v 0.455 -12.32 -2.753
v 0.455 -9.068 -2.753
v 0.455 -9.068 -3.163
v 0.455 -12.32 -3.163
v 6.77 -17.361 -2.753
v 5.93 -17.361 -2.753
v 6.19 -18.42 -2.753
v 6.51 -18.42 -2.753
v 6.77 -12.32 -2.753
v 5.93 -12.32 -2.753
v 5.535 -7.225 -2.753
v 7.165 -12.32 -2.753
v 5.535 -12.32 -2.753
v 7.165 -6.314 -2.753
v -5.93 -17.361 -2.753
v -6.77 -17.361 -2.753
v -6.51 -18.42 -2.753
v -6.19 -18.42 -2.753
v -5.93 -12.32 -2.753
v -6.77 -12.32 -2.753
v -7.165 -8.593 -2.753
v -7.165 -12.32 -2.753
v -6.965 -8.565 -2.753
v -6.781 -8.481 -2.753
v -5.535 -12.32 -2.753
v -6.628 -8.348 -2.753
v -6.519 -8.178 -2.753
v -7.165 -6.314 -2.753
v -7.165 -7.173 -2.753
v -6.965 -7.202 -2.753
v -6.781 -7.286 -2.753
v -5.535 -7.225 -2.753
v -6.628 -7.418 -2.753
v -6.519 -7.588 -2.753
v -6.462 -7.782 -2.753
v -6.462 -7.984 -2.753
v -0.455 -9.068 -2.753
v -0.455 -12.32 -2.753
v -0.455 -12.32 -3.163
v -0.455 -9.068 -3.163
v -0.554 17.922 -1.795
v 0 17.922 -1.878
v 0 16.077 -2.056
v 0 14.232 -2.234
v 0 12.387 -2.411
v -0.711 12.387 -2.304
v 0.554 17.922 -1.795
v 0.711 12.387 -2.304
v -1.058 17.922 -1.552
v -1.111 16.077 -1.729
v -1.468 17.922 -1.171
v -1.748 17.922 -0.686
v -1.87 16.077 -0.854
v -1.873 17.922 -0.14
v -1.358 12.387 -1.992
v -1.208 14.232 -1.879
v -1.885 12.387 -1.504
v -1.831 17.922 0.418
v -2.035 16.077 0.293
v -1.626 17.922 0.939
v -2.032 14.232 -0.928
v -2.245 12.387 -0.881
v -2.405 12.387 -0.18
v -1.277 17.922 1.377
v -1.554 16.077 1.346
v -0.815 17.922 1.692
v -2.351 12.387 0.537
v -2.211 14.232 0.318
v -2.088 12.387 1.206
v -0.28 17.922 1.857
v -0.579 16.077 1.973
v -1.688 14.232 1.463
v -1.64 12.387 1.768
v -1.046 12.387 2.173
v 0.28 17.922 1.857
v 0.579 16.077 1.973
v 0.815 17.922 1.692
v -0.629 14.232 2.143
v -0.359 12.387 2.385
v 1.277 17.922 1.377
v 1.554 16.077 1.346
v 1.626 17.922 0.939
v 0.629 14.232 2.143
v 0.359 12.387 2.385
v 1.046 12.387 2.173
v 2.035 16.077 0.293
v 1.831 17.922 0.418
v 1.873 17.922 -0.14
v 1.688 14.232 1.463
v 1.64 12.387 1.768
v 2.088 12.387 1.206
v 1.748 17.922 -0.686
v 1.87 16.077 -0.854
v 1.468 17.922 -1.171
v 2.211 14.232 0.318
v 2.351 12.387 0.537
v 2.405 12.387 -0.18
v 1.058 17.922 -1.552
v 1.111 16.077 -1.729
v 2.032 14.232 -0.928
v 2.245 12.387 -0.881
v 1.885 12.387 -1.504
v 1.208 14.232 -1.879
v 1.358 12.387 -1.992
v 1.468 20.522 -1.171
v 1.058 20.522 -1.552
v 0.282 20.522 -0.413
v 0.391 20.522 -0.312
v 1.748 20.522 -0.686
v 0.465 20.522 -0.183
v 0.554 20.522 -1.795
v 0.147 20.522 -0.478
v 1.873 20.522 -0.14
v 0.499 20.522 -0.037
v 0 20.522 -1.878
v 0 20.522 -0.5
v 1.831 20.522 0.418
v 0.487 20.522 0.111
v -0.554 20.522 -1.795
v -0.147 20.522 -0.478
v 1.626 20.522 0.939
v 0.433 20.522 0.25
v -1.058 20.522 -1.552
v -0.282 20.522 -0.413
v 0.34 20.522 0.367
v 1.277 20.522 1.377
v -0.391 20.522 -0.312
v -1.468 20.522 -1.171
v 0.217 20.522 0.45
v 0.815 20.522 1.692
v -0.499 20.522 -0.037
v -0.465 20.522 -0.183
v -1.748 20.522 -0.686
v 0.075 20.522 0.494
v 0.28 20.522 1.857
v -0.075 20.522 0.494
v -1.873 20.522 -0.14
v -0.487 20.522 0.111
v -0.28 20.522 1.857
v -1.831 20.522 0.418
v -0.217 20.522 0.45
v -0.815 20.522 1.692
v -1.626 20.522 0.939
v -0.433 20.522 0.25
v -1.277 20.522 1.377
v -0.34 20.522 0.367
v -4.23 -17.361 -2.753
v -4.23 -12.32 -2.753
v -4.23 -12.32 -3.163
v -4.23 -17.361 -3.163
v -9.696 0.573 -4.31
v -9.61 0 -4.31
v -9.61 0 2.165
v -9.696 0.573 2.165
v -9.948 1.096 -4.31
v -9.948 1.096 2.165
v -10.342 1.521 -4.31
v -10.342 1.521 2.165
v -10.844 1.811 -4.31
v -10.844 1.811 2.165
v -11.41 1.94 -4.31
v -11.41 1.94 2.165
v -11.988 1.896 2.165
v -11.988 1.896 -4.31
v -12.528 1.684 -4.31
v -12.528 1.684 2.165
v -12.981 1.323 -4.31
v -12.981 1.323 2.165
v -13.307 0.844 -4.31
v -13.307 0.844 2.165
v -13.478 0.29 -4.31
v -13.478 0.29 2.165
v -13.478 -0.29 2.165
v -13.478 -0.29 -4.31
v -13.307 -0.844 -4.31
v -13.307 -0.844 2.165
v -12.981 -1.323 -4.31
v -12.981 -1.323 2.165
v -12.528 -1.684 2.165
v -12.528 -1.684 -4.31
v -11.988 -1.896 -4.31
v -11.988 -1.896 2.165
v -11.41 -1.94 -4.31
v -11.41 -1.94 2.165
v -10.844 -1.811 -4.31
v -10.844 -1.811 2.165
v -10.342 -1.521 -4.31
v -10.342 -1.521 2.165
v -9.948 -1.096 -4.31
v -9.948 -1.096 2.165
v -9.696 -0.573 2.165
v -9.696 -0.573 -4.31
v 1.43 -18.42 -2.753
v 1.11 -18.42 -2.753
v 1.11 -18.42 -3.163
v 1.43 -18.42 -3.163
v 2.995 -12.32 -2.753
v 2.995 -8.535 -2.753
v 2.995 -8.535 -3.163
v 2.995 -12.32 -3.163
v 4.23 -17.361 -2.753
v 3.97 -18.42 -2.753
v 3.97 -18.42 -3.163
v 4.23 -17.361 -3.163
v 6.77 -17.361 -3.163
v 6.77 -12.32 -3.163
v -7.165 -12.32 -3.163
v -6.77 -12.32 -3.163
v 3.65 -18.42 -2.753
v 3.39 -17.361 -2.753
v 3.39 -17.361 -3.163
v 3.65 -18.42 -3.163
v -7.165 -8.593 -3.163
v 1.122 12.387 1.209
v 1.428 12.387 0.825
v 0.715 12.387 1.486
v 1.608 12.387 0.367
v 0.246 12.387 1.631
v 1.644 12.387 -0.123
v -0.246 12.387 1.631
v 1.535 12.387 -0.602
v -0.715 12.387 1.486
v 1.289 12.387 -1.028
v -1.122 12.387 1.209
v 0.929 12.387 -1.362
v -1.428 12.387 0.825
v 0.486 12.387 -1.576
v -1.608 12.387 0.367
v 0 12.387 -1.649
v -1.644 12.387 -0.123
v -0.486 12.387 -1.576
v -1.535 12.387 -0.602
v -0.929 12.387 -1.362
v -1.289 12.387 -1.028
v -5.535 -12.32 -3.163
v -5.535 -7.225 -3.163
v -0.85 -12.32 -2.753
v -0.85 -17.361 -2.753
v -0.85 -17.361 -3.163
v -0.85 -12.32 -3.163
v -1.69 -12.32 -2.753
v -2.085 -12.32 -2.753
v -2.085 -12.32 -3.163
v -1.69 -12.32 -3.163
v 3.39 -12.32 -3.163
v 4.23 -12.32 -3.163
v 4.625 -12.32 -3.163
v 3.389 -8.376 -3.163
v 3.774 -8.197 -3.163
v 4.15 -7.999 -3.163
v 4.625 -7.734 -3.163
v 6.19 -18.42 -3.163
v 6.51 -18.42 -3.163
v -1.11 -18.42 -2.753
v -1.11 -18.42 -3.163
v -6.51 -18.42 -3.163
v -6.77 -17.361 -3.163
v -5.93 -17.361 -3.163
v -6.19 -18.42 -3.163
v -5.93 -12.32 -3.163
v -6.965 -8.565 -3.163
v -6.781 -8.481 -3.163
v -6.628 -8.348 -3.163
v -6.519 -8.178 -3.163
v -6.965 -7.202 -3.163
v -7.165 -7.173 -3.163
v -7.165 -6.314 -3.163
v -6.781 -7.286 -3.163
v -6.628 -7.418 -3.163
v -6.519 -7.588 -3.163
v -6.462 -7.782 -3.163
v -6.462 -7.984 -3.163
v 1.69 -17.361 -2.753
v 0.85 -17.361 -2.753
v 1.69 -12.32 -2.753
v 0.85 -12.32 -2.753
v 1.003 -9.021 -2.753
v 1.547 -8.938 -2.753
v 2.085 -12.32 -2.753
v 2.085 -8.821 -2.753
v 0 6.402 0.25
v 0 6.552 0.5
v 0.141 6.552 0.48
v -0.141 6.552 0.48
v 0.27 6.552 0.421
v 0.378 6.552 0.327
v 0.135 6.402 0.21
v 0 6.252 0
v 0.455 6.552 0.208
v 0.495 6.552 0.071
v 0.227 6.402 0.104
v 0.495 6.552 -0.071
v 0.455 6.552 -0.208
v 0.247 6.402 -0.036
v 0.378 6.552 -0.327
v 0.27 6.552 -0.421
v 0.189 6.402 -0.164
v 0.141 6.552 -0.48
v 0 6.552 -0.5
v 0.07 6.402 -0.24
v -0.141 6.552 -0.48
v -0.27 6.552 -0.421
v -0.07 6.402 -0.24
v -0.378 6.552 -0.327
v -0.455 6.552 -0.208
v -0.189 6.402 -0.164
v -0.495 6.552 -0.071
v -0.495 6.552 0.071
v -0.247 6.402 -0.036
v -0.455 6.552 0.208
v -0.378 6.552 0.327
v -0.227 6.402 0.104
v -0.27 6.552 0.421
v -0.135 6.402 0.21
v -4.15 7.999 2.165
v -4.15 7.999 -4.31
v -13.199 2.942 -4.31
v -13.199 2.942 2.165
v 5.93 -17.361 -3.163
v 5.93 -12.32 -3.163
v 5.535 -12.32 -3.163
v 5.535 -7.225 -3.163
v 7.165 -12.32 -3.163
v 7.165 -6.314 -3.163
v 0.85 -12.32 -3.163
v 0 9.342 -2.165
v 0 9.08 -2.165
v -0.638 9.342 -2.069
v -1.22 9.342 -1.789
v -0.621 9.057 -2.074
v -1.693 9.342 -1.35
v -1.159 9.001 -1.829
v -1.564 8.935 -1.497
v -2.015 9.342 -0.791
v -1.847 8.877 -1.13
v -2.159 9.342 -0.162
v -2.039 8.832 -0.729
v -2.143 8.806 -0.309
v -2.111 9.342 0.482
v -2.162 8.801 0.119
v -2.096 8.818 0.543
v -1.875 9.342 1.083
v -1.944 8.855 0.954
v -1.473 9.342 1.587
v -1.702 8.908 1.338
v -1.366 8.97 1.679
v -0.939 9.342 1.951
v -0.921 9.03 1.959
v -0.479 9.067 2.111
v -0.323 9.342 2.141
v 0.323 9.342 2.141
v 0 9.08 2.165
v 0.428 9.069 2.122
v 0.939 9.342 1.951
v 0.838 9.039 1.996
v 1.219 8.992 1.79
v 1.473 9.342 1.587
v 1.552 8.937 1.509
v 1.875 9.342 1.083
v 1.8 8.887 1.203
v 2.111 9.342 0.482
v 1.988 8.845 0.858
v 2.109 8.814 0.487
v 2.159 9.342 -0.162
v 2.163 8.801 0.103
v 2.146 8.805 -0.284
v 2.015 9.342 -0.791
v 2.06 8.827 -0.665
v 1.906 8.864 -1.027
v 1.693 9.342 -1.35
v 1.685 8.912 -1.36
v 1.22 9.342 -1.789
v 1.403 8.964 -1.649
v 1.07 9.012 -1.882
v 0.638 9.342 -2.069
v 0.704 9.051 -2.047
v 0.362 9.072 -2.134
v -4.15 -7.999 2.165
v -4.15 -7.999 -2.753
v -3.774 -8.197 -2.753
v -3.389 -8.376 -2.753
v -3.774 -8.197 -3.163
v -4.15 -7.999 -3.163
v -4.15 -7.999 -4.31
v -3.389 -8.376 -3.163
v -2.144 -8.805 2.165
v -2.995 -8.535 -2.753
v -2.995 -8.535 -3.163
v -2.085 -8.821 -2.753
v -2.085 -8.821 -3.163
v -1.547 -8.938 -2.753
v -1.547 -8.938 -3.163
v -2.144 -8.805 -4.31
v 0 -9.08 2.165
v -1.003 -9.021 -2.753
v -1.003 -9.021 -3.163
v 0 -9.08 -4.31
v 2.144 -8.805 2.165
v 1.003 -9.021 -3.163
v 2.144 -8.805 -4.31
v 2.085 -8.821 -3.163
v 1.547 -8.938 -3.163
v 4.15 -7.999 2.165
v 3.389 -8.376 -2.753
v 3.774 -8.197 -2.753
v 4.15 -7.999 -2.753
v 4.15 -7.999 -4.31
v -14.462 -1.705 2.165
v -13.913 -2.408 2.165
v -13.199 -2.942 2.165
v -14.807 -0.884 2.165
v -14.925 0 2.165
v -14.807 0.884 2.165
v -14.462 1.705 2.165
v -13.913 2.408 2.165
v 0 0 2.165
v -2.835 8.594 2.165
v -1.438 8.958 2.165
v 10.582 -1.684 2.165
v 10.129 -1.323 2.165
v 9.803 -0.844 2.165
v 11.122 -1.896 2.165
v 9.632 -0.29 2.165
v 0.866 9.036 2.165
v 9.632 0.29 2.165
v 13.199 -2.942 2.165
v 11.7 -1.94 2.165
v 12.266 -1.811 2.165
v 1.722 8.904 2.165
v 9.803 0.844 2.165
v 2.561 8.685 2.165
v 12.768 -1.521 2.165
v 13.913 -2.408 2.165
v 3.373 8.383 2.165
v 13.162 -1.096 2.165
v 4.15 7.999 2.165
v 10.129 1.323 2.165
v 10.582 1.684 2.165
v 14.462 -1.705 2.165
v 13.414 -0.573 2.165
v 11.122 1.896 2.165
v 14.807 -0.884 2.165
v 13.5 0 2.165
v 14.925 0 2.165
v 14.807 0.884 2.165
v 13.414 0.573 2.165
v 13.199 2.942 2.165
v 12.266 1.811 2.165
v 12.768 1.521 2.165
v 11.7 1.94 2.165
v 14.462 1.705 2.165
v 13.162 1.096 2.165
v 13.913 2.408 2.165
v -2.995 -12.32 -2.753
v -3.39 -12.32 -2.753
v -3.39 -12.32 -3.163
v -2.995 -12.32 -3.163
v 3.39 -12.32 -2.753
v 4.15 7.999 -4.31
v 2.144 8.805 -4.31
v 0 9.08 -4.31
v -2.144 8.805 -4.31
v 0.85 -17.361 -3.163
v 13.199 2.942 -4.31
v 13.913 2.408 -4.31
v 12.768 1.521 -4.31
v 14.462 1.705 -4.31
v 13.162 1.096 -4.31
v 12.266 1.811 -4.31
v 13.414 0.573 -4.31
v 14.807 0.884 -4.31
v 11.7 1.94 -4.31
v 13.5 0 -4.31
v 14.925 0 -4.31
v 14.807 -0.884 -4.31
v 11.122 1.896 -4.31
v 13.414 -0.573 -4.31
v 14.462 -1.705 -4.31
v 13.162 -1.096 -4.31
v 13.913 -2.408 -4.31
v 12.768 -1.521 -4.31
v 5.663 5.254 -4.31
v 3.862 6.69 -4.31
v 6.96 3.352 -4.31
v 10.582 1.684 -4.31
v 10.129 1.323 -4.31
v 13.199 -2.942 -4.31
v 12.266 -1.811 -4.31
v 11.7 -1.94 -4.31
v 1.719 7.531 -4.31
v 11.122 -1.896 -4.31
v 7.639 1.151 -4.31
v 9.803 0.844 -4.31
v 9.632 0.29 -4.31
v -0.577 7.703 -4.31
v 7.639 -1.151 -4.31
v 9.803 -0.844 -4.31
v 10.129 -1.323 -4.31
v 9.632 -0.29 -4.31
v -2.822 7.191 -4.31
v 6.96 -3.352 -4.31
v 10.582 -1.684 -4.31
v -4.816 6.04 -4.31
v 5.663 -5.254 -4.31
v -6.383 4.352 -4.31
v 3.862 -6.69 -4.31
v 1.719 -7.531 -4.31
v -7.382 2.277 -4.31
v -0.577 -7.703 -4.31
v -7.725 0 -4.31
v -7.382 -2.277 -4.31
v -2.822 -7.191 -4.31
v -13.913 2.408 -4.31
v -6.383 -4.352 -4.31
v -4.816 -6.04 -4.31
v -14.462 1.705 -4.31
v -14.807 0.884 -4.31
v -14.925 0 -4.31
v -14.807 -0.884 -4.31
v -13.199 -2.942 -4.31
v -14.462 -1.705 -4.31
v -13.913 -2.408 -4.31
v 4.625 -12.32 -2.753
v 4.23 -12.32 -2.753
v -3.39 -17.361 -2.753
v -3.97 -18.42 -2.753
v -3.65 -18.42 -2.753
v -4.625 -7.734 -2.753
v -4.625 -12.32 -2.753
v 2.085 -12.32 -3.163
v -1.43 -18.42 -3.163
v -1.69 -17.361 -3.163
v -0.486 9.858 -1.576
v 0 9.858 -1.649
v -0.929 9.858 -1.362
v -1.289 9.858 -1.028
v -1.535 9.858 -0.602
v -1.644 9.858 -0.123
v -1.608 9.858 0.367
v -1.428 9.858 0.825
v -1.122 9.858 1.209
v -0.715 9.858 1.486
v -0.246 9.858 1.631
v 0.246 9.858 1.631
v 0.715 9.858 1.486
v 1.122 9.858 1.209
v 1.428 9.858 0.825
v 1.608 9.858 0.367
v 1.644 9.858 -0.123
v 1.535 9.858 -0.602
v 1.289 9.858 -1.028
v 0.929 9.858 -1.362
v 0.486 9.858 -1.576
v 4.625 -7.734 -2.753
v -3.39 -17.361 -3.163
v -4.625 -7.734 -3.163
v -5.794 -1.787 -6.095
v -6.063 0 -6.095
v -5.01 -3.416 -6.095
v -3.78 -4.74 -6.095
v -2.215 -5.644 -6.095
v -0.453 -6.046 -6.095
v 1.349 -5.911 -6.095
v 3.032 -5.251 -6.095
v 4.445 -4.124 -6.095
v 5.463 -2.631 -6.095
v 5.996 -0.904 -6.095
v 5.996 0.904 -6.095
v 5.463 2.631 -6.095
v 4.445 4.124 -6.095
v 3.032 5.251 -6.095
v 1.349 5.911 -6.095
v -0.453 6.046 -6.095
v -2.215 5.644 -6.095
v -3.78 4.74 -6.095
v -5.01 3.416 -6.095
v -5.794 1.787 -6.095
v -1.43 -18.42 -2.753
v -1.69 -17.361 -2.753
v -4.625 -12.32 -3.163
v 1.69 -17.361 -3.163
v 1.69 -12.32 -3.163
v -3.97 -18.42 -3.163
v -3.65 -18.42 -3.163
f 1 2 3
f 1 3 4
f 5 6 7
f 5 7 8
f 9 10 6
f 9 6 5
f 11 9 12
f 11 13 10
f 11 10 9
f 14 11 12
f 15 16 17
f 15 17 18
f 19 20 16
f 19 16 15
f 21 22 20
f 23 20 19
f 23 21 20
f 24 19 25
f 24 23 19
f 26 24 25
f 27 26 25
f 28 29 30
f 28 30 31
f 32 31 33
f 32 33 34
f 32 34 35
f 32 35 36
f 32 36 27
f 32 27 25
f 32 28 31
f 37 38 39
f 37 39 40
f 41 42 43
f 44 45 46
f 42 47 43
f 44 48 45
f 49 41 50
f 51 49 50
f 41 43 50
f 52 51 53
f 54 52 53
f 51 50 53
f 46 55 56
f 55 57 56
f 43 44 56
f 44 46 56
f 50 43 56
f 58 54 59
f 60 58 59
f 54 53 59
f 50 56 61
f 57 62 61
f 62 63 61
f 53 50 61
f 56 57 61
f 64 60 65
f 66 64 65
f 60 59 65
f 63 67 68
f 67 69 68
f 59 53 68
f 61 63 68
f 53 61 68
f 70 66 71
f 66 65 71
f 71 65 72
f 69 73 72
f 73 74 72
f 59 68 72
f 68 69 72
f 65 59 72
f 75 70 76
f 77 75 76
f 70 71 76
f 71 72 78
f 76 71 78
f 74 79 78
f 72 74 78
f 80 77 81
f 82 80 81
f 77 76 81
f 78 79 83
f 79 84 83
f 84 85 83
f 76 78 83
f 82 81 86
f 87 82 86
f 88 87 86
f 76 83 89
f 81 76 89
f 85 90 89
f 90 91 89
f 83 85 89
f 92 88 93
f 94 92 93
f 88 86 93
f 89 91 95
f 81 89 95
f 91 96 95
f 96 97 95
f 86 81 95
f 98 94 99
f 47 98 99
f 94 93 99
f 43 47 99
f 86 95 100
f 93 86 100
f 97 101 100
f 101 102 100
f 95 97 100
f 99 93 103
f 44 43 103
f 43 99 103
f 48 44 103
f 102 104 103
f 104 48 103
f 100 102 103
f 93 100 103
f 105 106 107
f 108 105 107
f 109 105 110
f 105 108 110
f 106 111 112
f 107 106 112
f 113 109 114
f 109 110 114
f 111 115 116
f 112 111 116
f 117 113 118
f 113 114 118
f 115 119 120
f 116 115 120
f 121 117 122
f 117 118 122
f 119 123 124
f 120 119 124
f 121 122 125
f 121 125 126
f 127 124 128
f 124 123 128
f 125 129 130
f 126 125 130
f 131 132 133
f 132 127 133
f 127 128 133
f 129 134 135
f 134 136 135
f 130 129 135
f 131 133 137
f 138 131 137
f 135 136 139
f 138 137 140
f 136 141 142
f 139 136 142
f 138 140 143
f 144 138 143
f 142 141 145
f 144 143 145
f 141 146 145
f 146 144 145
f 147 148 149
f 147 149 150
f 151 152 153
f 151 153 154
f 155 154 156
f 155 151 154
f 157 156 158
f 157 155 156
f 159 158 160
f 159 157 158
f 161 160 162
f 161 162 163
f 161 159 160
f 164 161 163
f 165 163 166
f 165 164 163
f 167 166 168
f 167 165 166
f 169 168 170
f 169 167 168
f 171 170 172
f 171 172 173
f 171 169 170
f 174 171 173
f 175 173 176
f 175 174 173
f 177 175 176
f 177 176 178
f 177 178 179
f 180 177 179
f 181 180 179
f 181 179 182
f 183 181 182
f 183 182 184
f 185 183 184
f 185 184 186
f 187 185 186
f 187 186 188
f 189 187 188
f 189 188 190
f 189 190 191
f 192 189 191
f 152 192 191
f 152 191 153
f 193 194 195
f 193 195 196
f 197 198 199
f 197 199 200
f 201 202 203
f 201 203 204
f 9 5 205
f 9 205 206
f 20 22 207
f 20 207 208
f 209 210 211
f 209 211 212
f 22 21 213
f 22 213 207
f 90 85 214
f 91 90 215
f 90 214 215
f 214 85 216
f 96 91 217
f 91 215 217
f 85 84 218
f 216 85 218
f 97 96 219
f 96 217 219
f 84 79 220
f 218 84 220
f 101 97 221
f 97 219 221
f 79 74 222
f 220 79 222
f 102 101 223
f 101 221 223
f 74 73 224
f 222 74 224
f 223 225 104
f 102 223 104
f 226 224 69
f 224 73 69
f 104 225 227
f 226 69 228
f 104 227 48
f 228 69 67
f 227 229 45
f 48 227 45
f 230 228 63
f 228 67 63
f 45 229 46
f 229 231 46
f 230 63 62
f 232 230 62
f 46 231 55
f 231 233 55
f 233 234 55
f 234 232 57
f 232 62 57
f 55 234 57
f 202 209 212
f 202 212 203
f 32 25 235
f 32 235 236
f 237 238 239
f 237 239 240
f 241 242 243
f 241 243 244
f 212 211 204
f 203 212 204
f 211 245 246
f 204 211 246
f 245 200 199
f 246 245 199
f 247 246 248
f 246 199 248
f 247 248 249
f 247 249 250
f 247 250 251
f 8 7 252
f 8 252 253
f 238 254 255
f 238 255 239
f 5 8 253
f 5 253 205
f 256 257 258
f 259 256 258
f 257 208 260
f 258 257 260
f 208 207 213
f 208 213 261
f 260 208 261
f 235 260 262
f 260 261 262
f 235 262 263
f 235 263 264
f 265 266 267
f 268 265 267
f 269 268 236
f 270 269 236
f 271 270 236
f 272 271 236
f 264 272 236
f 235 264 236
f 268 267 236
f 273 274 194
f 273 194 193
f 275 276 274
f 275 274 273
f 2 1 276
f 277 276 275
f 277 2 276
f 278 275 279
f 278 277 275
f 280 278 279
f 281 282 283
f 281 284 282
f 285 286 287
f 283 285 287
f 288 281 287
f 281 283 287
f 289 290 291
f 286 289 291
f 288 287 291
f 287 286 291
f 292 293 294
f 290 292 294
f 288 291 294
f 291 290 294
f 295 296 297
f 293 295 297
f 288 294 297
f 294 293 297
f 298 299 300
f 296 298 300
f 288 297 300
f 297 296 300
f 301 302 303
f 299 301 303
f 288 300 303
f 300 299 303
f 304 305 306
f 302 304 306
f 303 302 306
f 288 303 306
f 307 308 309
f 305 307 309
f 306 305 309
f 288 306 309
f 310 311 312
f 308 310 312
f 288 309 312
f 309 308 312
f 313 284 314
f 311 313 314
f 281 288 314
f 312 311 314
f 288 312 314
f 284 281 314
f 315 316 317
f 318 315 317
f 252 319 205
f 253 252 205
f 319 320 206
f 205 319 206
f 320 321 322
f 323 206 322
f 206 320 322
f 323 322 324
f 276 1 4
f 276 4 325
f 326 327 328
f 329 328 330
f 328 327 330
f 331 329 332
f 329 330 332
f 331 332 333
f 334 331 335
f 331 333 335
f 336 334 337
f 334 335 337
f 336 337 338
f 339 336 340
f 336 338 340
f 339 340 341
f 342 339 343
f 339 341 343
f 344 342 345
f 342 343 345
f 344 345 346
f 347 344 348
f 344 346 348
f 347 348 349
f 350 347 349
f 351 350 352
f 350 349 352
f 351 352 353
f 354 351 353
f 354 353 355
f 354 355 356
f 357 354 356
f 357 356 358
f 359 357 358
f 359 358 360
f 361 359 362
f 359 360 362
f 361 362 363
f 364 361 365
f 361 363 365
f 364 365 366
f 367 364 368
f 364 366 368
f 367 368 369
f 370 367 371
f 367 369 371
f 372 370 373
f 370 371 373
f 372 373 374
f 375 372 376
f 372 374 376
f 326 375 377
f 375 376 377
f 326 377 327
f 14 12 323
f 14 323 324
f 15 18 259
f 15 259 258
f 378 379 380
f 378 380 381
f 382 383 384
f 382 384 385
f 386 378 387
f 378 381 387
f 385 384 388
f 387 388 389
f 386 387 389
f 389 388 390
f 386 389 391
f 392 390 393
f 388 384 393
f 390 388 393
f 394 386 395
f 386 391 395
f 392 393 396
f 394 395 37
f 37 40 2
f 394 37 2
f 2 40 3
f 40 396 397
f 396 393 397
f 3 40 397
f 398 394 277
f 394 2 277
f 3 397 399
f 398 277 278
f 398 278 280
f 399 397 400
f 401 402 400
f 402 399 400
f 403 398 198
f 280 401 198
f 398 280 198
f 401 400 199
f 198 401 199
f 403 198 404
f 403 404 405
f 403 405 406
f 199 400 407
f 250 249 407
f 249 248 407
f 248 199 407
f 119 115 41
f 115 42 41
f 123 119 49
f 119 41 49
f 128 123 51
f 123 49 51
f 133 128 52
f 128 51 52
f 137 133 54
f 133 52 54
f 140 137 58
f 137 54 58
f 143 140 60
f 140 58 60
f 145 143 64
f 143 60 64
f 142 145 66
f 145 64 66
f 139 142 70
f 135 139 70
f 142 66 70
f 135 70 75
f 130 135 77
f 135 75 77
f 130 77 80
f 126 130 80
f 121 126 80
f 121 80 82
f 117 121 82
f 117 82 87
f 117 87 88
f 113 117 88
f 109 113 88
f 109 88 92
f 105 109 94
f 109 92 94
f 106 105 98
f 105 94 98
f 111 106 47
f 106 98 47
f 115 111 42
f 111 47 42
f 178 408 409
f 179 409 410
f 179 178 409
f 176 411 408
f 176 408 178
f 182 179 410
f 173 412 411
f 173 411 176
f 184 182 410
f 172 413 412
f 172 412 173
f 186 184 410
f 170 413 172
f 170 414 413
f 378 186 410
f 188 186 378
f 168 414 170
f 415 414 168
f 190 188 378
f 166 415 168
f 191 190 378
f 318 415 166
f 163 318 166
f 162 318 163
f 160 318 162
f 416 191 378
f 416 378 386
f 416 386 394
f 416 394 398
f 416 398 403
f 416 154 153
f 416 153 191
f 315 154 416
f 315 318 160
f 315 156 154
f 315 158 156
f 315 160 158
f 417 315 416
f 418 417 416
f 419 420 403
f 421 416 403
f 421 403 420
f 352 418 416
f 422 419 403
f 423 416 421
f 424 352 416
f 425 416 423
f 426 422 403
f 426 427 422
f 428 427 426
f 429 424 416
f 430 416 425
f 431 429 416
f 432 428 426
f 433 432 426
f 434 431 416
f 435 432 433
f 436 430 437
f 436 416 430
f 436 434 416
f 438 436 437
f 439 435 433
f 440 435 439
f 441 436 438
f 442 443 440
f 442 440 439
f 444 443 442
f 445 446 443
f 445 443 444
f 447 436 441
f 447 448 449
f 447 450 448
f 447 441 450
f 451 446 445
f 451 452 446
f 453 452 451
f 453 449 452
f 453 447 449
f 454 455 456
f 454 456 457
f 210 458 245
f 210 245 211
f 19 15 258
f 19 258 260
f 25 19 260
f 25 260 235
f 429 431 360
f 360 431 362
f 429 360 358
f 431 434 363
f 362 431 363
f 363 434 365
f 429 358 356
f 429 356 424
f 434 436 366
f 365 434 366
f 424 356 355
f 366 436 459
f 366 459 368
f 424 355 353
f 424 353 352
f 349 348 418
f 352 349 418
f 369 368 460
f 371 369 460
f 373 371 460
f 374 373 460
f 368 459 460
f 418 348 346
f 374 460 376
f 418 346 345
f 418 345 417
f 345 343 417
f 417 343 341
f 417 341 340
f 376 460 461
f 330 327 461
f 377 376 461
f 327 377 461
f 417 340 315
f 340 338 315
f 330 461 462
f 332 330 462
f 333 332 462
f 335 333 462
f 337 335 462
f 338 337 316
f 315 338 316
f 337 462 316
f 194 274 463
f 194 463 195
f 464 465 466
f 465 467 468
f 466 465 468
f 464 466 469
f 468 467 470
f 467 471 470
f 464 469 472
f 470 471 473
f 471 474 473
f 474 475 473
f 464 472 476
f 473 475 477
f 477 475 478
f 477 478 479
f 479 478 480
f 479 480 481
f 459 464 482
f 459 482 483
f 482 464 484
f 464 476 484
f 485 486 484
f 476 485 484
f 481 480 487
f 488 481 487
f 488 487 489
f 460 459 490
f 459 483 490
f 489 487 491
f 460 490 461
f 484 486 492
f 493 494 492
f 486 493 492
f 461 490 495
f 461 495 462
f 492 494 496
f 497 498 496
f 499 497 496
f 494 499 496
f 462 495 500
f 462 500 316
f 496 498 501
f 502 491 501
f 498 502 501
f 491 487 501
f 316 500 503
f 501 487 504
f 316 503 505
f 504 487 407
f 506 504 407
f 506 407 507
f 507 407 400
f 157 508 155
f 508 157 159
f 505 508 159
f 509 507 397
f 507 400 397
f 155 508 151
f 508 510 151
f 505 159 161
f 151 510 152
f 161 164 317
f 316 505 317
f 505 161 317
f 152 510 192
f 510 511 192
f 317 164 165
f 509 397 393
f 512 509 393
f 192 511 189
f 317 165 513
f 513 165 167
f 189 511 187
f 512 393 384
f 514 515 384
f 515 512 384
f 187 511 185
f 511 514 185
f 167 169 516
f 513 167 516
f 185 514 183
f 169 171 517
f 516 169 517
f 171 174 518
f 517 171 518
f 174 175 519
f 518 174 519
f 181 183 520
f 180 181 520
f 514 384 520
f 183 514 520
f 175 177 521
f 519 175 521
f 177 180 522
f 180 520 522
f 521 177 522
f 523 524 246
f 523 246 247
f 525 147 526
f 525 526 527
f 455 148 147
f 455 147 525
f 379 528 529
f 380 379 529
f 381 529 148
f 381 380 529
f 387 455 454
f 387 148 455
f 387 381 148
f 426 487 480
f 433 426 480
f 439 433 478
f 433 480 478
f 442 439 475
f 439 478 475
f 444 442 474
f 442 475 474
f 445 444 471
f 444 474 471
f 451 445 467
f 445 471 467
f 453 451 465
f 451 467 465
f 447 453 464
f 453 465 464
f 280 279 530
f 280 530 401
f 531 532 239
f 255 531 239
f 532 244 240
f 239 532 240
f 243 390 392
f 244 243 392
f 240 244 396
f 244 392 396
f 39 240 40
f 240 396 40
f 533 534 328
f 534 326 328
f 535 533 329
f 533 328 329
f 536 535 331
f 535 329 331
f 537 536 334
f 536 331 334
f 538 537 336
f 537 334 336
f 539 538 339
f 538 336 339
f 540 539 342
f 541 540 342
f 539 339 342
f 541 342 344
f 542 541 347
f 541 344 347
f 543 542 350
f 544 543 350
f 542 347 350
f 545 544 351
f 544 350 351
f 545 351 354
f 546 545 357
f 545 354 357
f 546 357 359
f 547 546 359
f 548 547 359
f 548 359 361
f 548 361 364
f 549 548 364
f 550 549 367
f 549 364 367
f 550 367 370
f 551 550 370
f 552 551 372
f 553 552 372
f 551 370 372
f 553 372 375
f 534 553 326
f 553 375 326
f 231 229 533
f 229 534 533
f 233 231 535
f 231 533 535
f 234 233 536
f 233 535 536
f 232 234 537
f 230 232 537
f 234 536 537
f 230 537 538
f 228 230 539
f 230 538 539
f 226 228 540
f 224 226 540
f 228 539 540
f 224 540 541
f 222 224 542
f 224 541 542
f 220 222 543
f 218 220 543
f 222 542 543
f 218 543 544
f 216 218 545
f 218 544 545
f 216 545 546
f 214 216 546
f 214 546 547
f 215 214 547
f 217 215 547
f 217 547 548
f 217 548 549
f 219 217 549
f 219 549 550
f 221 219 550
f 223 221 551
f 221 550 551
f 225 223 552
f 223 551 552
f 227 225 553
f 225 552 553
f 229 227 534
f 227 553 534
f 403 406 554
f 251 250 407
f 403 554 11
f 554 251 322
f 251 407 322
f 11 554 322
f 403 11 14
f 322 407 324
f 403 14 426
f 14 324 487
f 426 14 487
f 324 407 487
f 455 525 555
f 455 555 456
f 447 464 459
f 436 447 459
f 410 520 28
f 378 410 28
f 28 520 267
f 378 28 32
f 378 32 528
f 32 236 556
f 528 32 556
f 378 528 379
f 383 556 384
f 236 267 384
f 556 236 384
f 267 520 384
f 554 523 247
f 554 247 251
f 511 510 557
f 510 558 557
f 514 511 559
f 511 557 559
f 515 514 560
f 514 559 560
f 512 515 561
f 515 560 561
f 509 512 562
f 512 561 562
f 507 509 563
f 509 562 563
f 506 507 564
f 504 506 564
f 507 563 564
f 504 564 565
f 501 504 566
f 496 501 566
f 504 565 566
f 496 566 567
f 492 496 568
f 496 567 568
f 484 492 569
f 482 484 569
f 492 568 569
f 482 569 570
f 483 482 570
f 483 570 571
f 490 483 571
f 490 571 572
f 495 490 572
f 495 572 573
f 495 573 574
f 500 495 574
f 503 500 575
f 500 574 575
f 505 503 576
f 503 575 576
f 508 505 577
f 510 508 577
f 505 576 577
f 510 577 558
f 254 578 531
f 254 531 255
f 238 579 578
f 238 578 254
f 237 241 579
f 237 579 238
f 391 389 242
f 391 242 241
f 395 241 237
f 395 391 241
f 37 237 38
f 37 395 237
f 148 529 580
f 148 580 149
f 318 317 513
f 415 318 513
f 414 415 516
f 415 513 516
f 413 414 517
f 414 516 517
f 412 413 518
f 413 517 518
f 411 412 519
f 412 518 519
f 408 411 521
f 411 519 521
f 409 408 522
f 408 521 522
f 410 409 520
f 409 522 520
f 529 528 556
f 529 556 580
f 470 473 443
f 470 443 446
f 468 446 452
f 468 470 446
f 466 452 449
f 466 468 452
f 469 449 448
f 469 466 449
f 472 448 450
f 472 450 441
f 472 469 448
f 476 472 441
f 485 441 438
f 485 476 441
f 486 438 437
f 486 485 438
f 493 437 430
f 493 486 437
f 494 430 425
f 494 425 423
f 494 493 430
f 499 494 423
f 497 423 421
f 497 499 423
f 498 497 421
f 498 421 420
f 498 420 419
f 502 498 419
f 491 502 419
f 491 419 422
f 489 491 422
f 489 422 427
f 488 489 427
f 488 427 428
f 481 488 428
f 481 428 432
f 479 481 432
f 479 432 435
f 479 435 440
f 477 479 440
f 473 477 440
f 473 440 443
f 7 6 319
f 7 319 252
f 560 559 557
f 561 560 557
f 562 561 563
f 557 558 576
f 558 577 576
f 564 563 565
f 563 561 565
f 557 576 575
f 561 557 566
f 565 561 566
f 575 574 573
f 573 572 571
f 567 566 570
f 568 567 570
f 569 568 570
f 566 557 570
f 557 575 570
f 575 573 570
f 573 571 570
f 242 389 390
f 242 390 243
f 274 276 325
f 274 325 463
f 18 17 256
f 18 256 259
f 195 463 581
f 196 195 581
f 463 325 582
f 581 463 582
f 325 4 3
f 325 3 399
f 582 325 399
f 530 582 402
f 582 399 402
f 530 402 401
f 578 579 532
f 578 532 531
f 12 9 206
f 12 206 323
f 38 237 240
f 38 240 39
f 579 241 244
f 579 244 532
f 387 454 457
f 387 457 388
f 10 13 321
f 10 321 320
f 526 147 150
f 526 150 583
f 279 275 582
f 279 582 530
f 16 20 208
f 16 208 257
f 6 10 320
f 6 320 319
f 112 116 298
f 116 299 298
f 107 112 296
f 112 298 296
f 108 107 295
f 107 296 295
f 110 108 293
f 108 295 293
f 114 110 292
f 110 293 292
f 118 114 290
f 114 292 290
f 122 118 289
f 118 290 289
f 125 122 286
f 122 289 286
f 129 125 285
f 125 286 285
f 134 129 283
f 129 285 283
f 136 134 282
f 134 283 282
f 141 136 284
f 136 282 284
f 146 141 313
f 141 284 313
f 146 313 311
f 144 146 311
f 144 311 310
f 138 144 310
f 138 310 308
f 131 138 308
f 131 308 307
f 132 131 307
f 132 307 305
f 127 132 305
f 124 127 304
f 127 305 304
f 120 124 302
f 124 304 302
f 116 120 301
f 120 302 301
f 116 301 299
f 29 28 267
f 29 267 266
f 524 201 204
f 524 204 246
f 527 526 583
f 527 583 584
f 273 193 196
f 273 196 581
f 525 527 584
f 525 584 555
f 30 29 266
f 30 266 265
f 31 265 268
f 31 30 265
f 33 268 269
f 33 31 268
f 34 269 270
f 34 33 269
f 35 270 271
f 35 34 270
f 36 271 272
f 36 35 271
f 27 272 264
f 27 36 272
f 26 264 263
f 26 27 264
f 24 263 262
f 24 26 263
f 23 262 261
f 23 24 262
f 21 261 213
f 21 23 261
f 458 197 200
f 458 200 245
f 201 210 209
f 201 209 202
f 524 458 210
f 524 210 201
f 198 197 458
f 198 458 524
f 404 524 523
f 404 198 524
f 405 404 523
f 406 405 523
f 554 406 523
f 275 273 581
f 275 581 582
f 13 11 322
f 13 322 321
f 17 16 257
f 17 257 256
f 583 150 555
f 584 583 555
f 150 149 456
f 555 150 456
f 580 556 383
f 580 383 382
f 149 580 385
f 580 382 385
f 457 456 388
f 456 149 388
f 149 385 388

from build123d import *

# Parameters (mm, degrees)
EXTRUDE6_DEPTH               = 3.162924
EXTRUDE6_2_DEPTH             = 3.162924
EXTRUDE6_3_DEPTH             = 3.162924
EXTRUDE6_4_DEPTH             = 3.162924
EXTRUDE6_5_DEPTH             = 3.162924
EXTRUDE6_6_DEPTH             = 3.162924
EXTRUDE7_START               = -2.752923646
EXTRUDE7_DEPTH               = 2.752923646
EXTRUDE1_DEPTH               = 2.165
EXTRUDE1_DEPTH_BACK          = 6.095
SKETCH3_R                    = 1.945
F_1_0_1_DIAMETER_HOLE1_D     = 1
F_1_0_1_DIAMETER_HOLE1_DEPTH = 13.97
F_1_0_1_DIAMETER_HOLE1_TIP   = 0.30043031


# Read off the part's stored shape, not the designer's step: Extrude7
with BuildPart() as part:
    # Sketch7 → Extrude6 (new body)
    with BuildSketch(Plane.XY):
        with BuildLine():
            Line((-5.535, -12.32), (-5.535, -7.224956165))
            Line((-5.535, -7.224956165), (-7.165, -6.314002227))
            Line((-7.165, -6.314002227), (-7.165, -7.17281133))
            ThreePointArc((-7.165, -7.17281133), (-6.454703172, -7.883108158), (-7.165, -8.593404986))
            Line((-7.165, -8.593404986), (-7.165, -12.32))
            Line((-7.165, -12.32), (-6.77, -12.32))
            Line((-6.77, -12.32), (-6.77, -17.360738904))
            Line((-6.77, -17.360738904), (-6.510329667, -18.42))
            Line((-6.510329667, -18.42), (-6.189670333, -18.42))
            Line((-6.189670333, -18.42), (-5.93, -17.360738904))
            Line((-5.93, -17.360738904), (-5.93, -12.32))
            Line((-5.93, -12.32), (-5.535, -12.32))
        make_face()
    extrude(amount=-EXTRUDE6_DEPTH)


with BuildPart() as body_2:
    # Sketch7 → Extrude6 2 (new body)
    with BuildSketch(Plane.XY):
        with BuildLine():
            Line((-4.625, -7.733525542), (-4.625, -12.32))
            Line((-4.625, -12.32), (-4.23, -12.32))
            Line((-4.23, -12.32), (-4.23, -17.360738904))
            Line((-4.23, -17.360738904), (-3.970329667, -18.42))
            Line((-3.970329667, -18.42), (-3.649670333, -18.42))
            Line((-3.649670333, -18.42), (-3.39, -17.360738904))
            Line((-3.39, -17.360738904), (-3.39, -12.32))
            Line((-3.39, -12.32), (-2.995, -12.32))
            Line((-2.995, -12.32), (-2.995, -8.535310619))
            ThreePointArc((-2.995, -8.535310619), (-3.582478148, -8.288826526), (-4.149861063, -7.999065227))
            Line((-4.149861063, -7.999065227), (-4.625, -7.733525542))
        make_face()
    extrude(amount=-EXTRUDE6_2_DEPTH)


with BuildPart() as body_3:
    # Sketch7 → Extrude6 3 (new body)
    with BuildSketch(Plane.XY):
        with BuildLine():
            Line((-0.455, -12.32), (-0.455, -9.067822531))
            ThreePointArc((-0.455, -9.067822531), (-1.276005531, -8.983751864), (-2.085, -8.82051612))
            Line((-2.085, -8.82051612), (-2.085, -12.32))
            Line((-2.085, -12.32), (-1.69, -12.32))
            Line((-1.69, -12.32), (-1.69, -17.360738904))
            Line((-1.69, -17.360738904), (-1.430329667, -18.42))
            Line((-1.430329667, -18.42), (-1.109670333, -18.42))
            Line((-1.109670333, -18.42), (-0.85, -17.360738904))
            Line((-0.85, -17.360738904), (-0.85, -12.32))
            Line((-0.85, -12.32), (-0.455, -12.32))
        make_face()
    extrude(amount=-EXTRUDE6_3_DEPTH)


with BuildPart() as body_4:
    # Sketch7 → Extrude6 4 (new body)
    with BuildSketch(Plane.XY):
        with BuildLine():
            Line((4.625, -12.32), (4.625, -7.733525542))
            Line((4.625, -7.733525542), (4.149861063, -7.999065227))
            ThreePointArc((4.149861063, -7.999065227), (3.582478148, -8.288826526), (2.995, -8.535310619))
            Line((2.995, -8.535310619), (2.995, -12.32))
            Line((2.995, -12.32), (3.39, -12.32))
            Line((3.39, -12.32), (3.39, -17.360738904))
            Line((3.39, -17.360738904), (3.649670333, -18.42))
            Line((3.649670333, -18.42), (3.970329667, -18.42))
            Line((3.970329667, -18.42), (4.23, -17.360738904))
            Line((4.23, -17.360738904), (4.23, -12.32))
            Line((4.23, -12.32), (4.625, -12.32))
        make_face()
    extrude(amount=-EXTRUDE6_4_DEPTH)


with BuildPart() as body_5:
    # Sketch7 → Extrude6 5 (new body)
    with BuildSketch(Plane.XY):
        with BuildLine():
            Line((0.455, -9.067822531), (0.455, -12.32))
            Line((0.455, -12.32), (0.85, -12.32))
            Line((0.85, -12.32), (0.85, -17.360738904))
            Line((0.85, -17.360738904), (1.109670333, -18.42))
            Line((1.109670333, -18.42), (1.430329667, -18.42))
            Line((1.430329667, -18.42), (1.69, -17.360738904))
            Line((1.69, -17.360738904), (1.69, -12.32))
            Line((1.69, -12.32), (2.085, -12.32))
            Line((2.085, -12.32), (2.085, -8.82051612))
            ThreePointArc((2.085, -8.82051612), (1.276005531, -8.983751864), (0.455, -9.067822531))
        make_face()
    extrude(amount=-EXTRUDE6_5_DEPTH)


with BuildPart() as body_6:
    # Sketch7 → Extrude6 6 (new body)
    with BuildSketch(Plane.XY):
        Polygon((5.535, -7.224956165), (5.535, -12.32), (5.93, -12.32), (5.93, -17.360738904), (6.189670333, -18.42), (6.510329667, -18.42), (6.77, -17.360738904), (6.77, -12.32), (7.165, -12.32), (7.165, -6.314002227), align=None)
    extrude(amount=-EXTRUDE6_6_DEPTH)


with BuildPart() as extrude7_tool:
    # Extrude7 outline → Extrude7 (new body)
    with BuildSketch(Plane.XY.offset(EXTRUDE7_START)):
        with BuildLine():
            Line((-5.93, -17.360738904), (-5.93, -12.32))
            Line((-5.93, -12.32), (-5.535, -12.32))
            Line((-5.535, -12.32), (-5.535, -7.224956165))
            Line((-5.535, -7.224956165), (-7.165, -6.314002227))
            Line((-7.165, -6.314002227), (-7.165, -7.17281133))
            ThreePointArc((-7.165, -7.17281133), (-6.454703172, -7.883108158), (-7.165, -8.593404986))
            Line((-7.165, -8.593404986), (-7.165, -12.32))
            Line((-7.165, -12.32), (-6.77, -12.32))
            Line((-6.77, -12.32), (-6.77, -17.360738904))
            Line((-6.77, -17.360738904), (-6.510329667, -18.42))
            Line((-6.510329667, -18.42), (-6.189670333, -18.42))
            Line((-6.189670333, -18.42), (-5.93, -17.360738904))
        make_face()
        Polygon((6.77, -17.360738904), (6.77, -12.32), (7.165, -12.32), (7.165, -6.314002227), (5.535, -7.224956165), (5.535, -12.32), (5.93, -12.32), (5.93, -17.360738904), (6.189670333, -18.42), (6.510329667, -18.42), align=None)
        with BuildLine():
            Line((4.23, -17.360738904), (4.23, -12.32))
            Line((4.23, -12.32), (4.625, -12.32))
            Line((4.625, -12.32), (4.625, -7.733525542))
            Line((4.625, -7.733525542), (4.149861063, -7.999065227))
            ThreePointArc((4.149861063, -7.999065227), (3.582478148, -8.288826526), (2.995, -8.535310619))
            Line((2.995, -8.535310619), (2.995, -12.32))
            Line((2.995, -12.32), (3.39, -12.32))
            Line((3.39, -12.32), (3.39, -17.360738904))
            Line((3.39, -17.360738904), (3.649670333, -18.42))
            Line((3.649670333, -18.42), (3.970329667, -18.42))
            Line((3.970329667, -18.42), (4.23, -17.360738904))
        make_face()
        with BuildLine():
            Line((1.69, -17.360738904), (1.69, -12.32))
            Line((1.69, -12.32), (2.085, -12.32))
            Line((2.085, -12.32), (2.085, -8.82051612))
            ThreePointArc((2.085, -8.82051612), (1.276005531, -8.983751864), (0.455, -9.067822531))
            Line((0.455, -9.067822531), (0.455, -12.32))
            Line((0.455, -12.32), (0.85, -12.32))
            Line((0.85, -12.32), (0.85, -17.360738904))
            Line((0.85, -17.360738904), (1.109670333, -18.42))
            Line((1.109670333, -18.42), (1.430329667, -18.42))
            Line((1.430329667, -18.42), (1.69, -17.360738904))
        make_face()
        with BuildLine():
            Line((-0.85, -17.360738904), (-0.85, -12.32))
            Line((-0.85, -12.32), (-0.455, -12.32))
            Line((-0.455, -12.32), (-0.455, -9.067822531))
            ThreePointArc((-0.455, -9.067822531), (-1.276005531, -8.983751864), (-2.085, -8.82051612))
            Line((-2.085, -8.82051612), (-2.085, -12.32))
            Line((-2.085, -12.32), (-1.69, -12.32))
            Line((-1.69, -12.32), (-1.69, -17.360738904))
            Line((-1.69, -17.360738904), (-1.430329667, -18.42))
            Line((-1.430329667, -18.42), (-1.109670333, -18.42))
            Line((-1.109670333, -18.42), (-0.85, -17.360738904))
        make_face()
        with BuildLine():
            Line((-3.39, -17.360738904), (-3.39, -12.32))
            Line((-3.39, -12.32), (-2.995, -12.32))
            Line((-2.995, -12.32), (-2.995, -8.535310619))
            ThreePointArc((-2.995, -8.535310619), (-3.582478148, -8.288826526), (-4.149861063, -7.999065227))
            Line((-4.149861063, -7.999065227), (-4.625, -7.733525542))
            Line((-4.625, -7.733525542), (-4.625, -12.32))
            Line((-4.625, -12.32), (-4.23, -12.32))
            Line((-4.23, -12.32), (-4.23, -17.360738904))
            Line((-4.23, -17.360738904), (-3.970329667, -18.42))
            Line((-3.970329667, -18.42), (-3.649670333, -18.42))
            Line((-3.649670333, -18.42), (-3.39, -17.360738904))
        make_face()
    extrude(amount=EXTRUDE7_DEPTH)


with BuildPart() as part_1:
    add(part.part)

    # Extrude7: cut by extrude7_tool
    add(extrude7_tool.part, mode=Mode.SUBTRACT)



with BuildPart() as body_2_1:
    add(body_2.part)

    # Extrude7: cut by extrude7_tool
    add(extrude7_tool.part, mode=Mode.SUBTRACT)


with BuildPart() as body_3_1:
    add(body_3.part)

    # Extrude7: cut by extrude7_tool
    add(extrude7_tool.part, mode=Mode.SUBTRACT)


with BuildPart() as body_4_1:
    add(body_4.part)

    # Extrude7: cut by extrude7_tool
    add(extrude7_tool.part, mode=Mode.SUBTRACT)


with BuildPart() as body_5_1:
    add(body_5.part)

    # Extrude7: cut by extrude7_tool
    add(extrude7_tool.part, mode=Mode.SUBTRACT)


with BuildPart() as body_6_1:
    add(body_6.part)

    # Extrude7: cut by extrude7_tool
    add(extrude7_tool.part, mode=Mode.SUBTRACT)


with BuildPart() as part_2:
    add(part_1.part)

    add(body_2_1.part)  # Extrude1 merges body 2

    add(body_3_1.part)  # Extrude1 merges body 3

    add(body_4_1.part)  # Extrude1 merges body 4

    add(body_5_1.part)  # Extrude1 merges body 5

    add(body_6_1.part)  # Extrude1 merges body 6
    # Sketch3 → Extrude1 (add, two sides: drawn at the far end of the back side and taken through both)
    with BuildSketch(Plane.XY.offset(-EXTRUDE1_DEPTH_BACK)):
        with BuildLine():
            Line((4.149861063, -7.999065227), (13.199056425, -2.941764516))
            ThreePointArc((13.199056425, -2.941764516), (14.925, 0), (13.199056425, 2.941764516))
            Line((13.199056425, 2.941764516), (4.149861063, 7.999065227))
            ThreePointArc((4.149861063, 7.999065227), (0, 9.08), (-4.149861063, 7.999065227))
            Line((-4.149861063, 7.999065227), (-13.199056425, 2.941764516))
            ThreePointArc((-13.199056425, 2.941764516), (-14.925, 0), (-13.199056425, -2.941764516))
            Line((-13.199056425, -2.941764516), (-4.149861063, -7.999065227))
            ThreePointArc((-4.149861063, -7.999065227), (0, -9.08), (4.149861063, -7.999065227))
        make_face()
        with Locations((11.555, 0)):
            Circle(SKETCH3_R, mode=Mode.SUBTRACT)
        with Locations((-11.555, 0)):
            Circle(SKETCH3_R, mode=Mode.SUBTRACT)
    extrude(amount=EXTRUDE1_DEPTH + EXTRUDE1_DEPTH_BACK)

    # Sketch5 → Cut-Revolve1 (revolve, cut)
    with BuildSketch(Plane(origin=(0, 0, 0), x_dir=(0, 0, -1), z_dir=(1, 0, 0)), mode=Mode.PRIVATE) as cut_revolve1_sk:
        Polygon((4.310187736, -16.063245386), (4.310187736, -7.724967149), (6.095, -6.063245386), (6.095, -16.063245386), align=None)
    revolve(cut_revolve1_sk.sketch.rotate(Axis((0, 0, 0), (0, 0, 1)), 270), axis=Axis((0, 0, 0), (0, 0, 1)), mode=Mode.SUBTRACT)

    # Sketch8 → Revolve1 (revolve)
    with BuildSketch(Plane(origin=(0, 0, 0), x_dir=(0, 0, -1), z_dir=(1, 0, 0)), mode=Mode.PRIVATE) as revolve1_sk:
        Polygon((0, 0), (0, 20.522309629), (-1.878035446, 20.522309629), (-1.878035446, 17.921716672), (-2.411490412, 12.387121404), (-1.649027846, 12.387121404), (-1.649027846, 9.857883061), (-2.165, 9.342309629), (-2.165, 0), align=None)
    revolve(revolve1_sk.sketch.rotate(Axis((0, 20.522309629, 0), (0, 1, 0)), 180), axis=Axis((0, 20.522309629, 0), (0, 1, 0)))

    # Ø1.0 (1) Diameter Hole1
    with Locations(Plane.ZX.offset(20.522309629)):
        with Locations((0, 0)):
            Hole(F_1_0_1_DIAMETER_HOLE1_D / 2, depth=F_1_0_1_DIAMETER_HOLE1_DEPTH)
            with Locations((0, 0, -(F_1_0_1_DIAMETER_HOLE1_DEPTH + F_1_0_1_DIAMETER_HOLE1_TIP / 2))):  # 118° drill point
                Cone(0, F_1_0_1_DIAMETER_HOLE1_D / 2, F_1_0_1_DIAMETER_HOLE1_TIP, mode=Mode.SUBTRACT)


solid = part_2.part
